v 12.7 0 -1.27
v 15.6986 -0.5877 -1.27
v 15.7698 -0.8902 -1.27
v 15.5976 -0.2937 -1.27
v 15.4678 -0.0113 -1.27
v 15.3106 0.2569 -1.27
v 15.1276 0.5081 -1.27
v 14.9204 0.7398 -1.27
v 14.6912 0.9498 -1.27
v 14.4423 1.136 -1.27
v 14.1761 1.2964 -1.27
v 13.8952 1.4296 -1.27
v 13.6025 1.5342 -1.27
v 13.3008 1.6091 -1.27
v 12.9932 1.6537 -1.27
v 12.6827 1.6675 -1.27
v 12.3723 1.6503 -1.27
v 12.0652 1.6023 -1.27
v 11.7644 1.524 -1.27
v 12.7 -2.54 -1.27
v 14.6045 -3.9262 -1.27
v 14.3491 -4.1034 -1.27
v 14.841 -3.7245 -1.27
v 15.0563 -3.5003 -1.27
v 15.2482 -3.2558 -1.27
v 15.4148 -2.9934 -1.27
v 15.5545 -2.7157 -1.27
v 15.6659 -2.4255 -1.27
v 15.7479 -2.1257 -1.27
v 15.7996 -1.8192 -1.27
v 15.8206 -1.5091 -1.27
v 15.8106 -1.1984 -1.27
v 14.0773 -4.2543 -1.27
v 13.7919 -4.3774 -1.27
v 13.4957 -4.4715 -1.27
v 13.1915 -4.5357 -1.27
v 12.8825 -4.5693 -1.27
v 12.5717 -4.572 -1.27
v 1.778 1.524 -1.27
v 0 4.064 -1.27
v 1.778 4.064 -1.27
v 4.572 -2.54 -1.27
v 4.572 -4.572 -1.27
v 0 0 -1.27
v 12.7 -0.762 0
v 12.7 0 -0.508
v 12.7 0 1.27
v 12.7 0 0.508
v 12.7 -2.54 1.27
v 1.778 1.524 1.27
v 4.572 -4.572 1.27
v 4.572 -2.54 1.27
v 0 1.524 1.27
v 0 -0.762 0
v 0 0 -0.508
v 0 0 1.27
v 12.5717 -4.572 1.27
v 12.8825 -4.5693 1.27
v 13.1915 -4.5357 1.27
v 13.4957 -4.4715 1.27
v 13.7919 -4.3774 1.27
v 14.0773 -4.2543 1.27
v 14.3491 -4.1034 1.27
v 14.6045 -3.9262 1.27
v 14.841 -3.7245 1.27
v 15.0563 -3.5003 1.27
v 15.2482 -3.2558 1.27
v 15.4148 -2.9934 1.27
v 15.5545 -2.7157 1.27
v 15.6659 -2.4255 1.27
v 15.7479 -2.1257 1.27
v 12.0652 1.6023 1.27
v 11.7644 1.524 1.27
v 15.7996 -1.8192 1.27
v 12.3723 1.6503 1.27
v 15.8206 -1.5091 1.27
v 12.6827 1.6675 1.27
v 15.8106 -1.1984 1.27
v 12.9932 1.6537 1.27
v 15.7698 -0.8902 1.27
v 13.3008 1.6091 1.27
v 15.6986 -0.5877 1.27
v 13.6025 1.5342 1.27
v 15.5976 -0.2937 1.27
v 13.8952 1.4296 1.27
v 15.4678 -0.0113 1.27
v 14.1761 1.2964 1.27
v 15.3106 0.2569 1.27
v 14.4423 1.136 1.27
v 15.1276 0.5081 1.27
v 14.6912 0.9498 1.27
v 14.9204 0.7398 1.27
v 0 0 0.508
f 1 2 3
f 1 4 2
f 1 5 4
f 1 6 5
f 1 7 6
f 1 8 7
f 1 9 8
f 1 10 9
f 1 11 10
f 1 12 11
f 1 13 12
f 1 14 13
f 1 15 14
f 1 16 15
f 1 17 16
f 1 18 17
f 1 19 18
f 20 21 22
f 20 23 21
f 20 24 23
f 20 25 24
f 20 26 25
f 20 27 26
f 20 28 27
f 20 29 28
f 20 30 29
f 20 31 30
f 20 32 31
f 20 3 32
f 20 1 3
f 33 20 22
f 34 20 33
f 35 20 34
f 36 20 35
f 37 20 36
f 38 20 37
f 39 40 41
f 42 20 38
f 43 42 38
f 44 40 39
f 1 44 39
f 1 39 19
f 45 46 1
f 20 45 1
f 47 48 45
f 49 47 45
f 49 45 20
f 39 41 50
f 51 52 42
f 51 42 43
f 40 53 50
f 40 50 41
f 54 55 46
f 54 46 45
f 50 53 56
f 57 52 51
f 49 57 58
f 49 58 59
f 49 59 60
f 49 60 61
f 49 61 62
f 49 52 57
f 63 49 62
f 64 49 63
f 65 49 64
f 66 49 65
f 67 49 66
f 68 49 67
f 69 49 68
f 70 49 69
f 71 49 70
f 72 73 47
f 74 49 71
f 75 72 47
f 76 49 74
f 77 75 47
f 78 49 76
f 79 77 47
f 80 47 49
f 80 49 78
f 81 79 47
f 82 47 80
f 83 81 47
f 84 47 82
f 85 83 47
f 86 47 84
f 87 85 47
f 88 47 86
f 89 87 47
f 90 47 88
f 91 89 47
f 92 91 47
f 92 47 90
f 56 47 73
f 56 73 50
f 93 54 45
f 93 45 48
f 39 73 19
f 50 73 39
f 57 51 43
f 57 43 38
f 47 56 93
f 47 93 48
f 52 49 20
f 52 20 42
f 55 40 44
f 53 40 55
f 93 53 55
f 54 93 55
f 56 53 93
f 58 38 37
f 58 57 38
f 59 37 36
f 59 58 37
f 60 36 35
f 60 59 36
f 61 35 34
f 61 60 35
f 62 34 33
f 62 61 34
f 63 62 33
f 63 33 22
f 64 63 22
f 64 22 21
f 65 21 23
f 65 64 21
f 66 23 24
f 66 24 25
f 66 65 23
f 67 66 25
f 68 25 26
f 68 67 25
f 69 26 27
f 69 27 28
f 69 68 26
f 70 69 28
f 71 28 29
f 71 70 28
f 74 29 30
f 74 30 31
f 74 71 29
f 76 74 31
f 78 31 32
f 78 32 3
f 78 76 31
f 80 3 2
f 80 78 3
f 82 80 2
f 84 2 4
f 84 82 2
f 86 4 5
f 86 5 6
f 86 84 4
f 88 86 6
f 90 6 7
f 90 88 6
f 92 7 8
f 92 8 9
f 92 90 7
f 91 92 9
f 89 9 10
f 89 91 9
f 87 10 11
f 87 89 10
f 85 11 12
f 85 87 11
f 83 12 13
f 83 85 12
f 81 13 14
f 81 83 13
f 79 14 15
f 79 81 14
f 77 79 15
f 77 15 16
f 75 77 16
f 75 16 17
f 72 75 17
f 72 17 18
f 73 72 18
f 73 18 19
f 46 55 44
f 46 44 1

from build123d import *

# Parameters (mm, degrees)
F1_DEPTH = 1.27
F3_DEPTH = 12.7
F6_DEPTH = 1.778


with BuildPart() as f1:
    # F0 (on Top) → F1 (new body, symmetric)
    with BuildSketch(Plane.XY):
        with BuildLine():
            Line((0, 1.524), (0, 0))
            Line((0, 0), (12.7, 0))
            Line((12.7, 0), (12.7, -2.54))
            Line((12.7, -2.54), (4.572, -2.54))
            Line((4.572, -2.54), (4.572, -4.572))
            Line((4.572, -4.572), (12.5717104354, -4.572))
            ThreePointArc((12.5717104354, -4.572), (15.7940682602, -1.0438103752), (11.7644204026, 1.524))
            Line((11.7644204026, 1.524), (0, 1.524))
        make_face()
    extrude(amount=F1_DEPTH, both=True)

    # F2 (on face) → F3 (join, through all)
    with BuildSketch(Plane(origin=(0, 0, 0), x_dir=(0, -1, 0), z_dir=(-1, 0, 0))):
        Polygon((0.762, 0), (0, 0.508), (0, -0.508), align=None)
    extrude(amount=-F3_DEPTH)

    # F5 (on face) → F6 (join)
    with BuildSketch(Plane(origin=(0, 0, 0), x_dir=(0, -1, 0), z_dir=(-1, 0, 0))):
        Polygon((-4.064, -1.27), (-1.524, -1.27), (-1.524, 1.27), align=None)
    extrude(amount=-F6_DEPTH)


with BuildPart() as f7_1:
    # F7: copy of F1
    add(f1.part)


solid = f1.part
